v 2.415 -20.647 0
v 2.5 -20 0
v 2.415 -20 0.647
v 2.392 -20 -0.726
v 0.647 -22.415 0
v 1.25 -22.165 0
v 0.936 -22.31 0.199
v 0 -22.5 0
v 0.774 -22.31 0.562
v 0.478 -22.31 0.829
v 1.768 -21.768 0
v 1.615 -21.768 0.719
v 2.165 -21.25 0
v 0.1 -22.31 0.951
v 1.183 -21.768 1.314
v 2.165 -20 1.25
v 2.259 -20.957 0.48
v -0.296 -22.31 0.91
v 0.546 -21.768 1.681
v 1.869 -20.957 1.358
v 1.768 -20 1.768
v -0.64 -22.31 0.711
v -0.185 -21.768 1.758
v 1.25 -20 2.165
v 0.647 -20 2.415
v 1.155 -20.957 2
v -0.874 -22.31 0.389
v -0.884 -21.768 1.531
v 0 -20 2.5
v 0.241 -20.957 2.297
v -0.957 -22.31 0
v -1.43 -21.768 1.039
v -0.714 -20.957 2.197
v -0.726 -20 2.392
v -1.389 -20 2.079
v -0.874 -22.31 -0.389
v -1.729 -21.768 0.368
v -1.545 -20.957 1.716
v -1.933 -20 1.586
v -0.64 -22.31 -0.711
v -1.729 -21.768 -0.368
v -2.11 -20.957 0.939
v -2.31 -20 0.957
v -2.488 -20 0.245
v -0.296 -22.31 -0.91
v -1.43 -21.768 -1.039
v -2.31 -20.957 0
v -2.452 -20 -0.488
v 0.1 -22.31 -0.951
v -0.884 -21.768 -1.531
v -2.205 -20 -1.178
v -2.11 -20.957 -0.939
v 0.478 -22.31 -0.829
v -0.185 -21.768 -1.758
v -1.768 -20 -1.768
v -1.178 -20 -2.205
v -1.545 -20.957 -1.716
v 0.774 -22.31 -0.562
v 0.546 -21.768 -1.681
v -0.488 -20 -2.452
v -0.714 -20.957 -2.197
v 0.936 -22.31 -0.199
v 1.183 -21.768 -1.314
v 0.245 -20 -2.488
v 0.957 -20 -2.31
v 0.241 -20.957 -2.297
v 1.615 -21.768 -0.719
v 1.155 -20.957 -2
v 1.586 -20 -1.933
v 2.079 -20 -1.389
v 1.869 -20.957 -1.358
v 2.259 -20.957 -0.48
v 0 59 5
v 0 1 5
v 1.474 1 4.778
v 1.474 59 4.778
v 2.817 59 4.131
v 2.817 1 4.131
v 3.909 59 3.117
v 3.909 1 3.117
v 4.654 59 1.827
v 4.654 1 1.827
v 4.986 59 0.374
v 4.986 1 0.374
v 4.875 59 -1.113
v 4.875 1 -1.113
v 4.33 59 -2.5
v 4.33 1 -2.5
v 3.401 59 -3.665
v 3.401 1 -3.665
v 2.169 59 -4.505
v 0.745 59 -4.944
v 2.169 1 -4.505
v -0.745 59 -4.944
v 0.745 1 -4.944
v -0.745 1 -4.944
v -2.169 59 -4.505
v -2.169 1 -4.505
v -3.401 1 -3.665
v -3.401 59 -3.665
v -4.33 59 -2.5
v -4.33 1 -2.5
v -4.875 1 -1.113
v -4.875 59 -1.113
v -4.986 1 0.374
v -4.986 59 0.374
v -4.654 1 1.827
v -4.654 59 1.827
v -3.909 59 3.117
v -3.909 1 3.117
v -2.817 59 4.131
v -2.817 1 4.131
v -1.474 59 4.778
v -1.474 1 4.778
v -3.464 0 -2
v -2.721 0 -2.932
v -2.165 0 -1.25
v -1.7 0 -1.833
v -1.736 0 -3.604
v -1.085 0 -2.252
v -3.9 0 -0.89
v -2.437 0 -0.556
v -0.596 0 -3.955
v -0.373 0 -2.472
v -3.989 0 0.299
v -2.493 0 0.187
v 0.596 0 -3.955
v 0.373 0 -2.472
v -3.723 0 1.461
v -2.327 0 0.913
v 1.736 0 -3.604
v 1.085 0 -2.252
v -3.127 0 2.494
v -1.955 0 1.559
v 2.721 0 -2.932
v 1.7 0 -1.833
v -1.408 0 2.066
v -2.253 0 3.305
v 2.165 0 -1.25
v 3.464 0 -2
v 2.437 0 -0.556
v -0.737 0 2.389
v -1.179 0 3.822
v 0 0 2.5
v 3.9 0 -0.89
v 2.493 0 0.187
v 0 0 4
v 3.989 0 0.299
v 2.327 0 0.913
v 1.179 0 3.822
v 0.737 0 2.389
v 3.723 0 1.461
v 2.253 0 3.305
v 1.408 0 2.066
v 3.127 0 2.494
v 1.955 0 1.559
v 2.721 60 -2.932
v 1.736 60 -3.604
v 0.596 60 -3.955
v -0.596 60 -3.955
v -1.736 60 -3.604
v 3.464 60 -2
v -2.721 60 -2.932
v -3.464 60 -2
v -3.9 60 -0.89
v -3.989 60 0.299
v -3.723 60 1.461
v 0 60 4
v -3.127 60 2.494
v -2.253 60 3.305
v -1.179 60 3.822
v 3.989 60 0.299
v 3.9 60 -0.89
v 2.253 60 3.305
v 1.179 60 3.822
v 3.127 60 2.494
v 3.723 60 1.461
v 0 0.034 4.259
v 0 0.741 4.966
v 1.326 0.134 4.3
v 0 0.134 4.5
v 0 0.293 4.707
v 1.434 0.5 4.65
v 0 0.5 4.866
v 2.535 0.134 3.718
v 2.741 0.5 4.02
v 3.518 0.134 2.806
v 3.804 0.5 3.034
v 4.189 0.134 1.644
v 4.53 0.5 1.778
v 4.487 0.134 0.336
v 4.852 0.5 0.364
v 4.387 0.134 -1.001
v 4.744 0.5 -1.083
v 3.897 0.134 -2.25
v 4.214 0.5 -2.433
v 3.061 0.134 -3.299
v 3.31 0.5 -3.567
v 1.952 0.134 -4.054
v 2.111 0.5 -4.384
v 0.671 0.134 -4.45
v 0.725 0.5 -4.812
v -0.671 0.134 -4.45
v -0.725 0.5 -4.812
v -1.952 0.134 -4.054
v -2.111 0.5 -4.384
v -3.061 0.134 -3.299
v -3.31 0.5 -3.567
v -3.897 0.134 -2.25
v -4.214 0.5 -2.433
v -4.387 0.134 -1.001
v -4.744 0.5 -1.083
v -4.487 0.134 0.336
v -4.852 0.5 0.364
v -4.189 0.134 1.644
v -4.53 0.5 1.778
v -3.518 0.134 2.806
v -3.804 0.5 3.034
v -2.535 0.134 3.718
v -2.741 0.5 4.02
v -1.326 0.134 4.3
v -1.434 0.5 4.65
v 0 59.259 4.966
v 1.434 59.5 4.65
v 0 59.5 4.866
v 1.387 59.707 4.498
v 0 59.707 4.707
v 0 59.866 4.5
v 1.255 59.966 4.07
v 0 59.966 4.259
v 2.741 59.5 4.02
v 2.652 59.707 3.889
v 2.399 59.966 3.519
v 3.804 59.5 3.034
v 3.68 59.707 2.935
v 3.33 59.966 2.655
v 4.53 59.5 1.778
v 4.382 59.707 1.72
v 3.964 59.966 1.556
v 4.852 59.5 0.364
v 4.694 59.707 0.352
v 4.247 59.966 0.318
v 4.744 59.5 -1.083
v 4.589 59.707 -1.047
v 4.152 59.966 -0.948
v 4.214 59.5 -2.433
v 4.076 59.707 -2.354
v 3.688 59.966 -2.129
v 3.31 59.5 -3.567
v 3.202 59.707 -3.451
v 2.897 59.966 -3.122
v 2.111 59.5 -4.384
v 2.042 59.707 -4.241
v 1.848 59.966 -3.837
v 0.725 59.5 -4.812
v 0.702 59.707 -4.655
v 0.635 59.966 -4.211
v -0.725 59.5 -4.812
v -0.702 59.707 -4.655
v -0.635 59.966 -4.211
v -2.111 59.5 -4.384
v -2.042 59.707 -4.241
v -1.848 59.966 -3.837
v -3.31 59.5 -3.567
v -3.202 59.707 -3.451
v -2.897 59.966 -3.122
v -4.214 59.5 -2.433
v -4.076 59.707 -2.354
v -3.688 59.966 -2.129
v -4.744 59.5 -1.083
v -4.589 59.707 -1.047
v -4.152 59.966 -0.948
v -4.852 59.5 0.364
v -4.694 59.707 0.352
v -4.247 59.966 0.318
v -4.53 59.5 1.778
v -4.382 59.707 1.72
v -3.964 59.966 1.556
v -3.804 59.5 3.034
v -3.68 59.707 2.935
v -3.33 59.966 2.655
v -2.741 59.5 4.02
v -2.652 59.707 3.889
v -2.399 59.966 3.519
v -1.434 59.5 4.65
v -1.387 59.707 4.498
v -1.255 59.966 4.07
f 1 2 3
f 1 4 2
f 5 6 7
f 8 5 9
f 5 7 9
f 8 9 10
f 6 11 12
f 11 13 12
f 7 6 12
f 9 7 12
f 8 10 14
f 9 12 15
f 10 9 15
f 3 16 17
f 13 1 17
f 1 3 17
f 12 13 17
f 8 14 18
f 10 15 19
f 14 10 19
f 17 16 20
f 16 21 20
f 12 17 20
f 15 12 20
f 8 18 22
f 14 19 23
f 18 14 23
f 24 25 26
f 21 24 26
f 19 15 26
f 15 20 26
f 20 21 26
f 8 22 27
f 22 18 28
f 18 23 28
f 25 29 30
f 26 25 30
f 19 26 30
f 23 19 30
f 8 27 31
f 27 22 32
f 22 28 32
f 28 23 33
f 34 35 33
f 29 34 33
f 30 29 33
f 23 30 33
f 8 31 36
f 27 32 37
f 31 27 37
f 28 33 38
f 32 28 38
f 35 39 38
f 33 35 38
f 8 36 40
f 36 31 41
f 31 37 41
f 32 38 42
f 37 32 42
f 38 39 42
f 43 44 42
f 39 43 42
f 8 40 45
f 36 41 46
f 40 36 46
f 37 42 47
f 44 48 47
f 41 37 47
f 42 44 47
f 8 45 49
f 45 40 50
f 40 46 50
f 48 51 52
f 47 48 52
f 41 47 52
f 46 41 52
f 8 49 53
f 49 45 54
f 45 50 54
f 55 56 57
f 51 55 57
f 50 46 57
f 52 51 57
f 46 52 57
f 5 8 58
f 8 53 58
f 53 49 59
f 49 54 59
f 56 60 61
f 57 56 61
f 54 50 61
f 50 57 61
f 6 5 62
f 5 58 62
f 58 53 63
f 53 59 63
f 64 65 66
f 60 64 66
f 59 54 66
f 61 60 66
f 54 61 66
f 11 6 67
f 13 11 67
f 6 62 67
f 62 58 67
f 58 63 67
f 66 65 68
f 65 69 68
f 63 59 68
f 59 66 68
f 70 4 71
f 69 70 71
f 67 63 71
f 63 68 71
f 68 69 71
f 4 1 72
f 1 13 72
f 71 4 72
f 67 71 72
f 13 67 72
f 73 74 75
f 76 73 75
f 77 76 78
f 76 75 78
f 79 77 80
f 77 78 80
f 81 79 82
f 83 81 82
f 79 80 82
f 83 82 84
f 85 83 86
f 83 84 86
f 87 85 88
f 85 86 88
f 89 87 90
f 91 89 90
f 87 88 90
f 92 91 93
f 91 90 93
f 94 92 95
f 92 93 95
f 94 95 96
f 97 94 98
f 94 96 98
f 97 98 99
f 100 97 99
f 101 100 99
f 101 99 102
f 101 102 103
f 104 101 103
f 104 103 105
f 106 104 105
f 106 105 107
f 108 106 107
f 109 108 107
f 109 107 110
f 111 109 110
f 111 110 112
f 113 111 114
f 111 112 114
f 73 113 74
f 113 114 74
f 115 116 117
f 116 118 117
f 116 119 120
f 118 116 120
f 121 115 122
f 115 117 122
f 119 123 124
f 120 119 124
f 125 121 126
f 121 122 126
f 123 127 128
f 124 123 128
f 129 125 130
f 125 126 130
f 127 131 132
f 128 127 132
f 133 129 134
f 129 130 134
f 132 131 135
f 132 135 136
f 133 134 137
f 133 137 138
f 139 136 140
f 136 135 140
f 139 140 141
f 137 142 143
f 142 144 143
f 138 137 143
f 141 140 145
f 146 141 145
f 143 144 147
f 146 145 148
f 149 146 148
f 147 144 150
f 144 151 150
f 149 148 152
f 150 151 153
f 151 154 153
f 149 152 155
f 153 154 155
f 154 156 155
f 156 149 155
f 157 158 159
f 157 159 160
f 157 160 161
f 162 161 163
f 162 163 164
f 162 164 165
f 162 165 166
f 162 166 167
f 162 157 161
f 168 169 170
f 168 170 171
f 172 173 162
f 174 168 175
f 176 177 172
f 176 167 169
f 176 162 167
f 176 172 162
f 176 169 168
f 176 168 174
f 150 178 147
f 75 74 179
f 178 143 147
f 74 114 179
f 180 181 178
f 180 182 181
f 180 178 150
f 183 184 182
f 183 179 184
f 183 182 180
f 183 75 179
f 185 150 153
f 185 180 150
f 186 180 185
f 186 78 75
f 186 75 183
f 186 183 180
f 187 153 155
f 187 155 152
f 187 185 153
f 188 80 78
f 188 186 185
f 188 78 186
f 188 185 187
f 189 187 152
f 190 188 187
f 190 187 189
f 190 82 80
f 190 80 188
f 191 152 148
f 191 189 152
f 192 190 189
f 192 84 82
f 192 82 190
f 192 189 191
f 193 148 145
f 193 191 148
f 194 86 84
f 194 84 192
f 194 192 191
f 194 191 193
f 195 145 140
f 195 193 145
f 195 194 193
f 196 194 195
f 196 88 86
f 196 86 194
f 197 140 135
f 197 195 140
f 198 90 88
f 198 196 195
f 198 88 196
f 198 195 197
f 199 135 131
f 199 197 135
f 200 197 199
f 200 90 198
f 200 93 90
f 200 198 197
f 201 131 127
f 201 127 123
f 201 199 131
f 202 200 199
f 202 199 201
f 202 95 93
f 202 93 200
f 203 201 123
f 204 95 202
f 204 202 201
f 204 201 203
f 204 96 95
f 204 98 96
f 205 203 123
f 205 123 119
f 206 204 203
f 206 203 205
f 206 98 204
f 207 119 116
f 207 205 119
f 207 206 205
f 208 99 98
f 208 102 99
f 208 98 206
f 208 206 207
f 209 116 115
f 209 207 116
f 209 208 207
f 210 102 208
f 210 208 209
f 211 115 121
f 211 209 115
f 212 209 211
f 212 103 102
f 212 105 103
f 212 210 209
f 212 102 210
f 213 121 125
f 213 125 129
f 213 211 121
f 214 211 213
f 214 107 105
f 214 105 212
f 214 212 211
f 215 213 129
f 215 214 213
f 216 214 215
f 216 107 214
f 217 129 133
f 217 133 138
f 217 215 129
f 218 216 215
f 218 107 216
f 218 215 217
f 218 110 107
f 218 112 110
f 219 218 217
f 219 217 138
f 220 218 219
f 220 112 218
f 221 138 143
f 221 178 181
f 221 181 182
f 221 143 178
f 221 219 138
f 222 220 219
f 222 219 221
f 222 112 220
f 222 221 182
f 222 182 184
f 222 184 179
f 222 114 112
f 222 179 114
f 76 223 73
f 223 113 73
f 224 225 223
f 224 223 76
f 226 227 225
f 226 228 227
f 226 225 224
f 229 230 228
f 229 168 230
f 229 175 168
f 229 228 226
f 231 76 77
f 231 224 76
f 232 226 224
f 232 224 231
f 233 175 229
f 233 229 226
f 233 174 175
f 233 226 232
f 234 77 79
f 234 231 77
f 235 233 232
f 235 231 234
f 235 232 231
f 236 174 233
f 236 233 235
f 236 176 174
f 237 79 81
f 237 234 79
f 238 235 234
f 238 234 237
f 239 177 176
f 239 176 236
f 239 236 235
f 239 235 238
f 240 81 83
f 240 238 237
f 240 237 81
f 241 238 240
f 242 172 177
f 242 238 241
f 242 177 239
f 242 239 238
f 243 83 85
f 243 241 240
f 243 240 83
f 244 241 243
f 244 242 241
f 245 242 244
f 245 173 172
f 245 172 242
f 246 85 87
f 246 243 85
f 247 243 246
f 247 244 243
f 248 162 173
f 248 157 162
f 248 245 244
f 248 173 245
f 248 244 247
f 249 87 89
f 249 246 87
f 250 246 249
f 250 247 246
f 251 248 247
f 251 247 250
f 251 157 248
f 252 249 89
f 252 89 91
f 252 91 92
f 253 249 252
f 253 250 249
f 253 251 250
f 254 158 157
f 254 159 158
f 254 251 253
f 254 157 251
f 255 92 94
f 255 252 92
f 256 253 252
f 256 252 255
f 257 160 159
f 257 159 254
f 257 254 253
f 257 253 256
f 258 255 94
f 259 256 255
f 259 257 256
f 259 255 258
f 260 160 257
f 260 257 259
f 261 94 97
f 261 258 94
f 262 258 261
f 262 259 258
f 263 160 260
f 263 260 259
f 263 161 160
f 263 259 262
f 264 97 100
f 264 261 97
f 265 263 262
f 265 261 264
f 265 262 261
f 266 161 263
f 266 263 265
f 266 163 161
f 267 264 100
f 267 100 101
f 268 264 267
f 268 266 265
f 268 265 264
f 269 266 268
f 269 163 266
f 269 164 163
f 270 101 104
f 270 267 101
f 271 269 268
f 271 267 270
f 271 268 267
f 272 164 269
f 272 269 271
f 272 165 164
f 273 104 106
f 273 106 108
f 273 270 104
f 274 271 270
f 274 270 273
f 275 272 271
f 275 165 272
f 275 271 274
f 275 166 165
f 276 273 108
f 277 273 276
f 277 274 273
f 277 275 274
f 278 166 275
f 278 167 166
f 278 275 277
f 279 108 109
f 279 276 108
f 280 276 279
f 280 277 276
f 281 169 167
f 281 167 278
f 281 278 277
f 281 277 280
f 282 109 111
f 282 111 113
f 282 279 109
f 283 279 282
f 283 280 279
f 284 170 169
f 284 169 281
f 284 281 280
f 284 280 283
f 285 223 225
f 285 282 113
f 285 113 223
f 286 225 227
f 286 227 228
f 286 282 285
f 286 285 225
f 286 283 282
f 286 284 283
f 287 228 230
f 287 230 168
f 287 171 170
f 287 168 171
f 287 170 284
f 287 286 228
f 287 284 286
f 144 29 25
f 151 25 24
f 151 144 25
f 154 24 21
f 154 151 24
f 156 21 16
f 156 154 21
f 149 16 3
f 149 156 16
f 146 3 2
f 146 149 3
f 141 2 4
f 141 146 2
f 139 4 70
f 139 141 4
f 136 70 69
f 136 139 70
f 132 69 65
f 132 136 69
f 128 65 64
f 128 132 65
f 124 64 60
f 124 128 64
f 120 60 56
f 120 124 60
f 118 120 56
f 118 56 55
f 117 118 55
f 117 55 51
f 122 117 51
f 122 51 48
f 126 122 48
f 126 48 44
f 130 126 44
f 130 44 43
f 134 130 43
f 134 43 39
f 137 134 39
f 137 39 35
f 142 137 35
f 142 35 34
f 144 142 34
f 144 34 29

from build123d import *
from build123d.topology import SkipClean

# Parameters (mm, degrees)
SKETCH_1_R      = 5
EXTRUDE_1_DEPTH = 60
SKETCH_2_R      = 2.5
EXTRUDE_2_DEPTH = 20
FILLET_1_R      = 1


with BuildPart() as part:
    # 草图1 → 凸台-拉伸1 (new body)
    with BuildSketch(Plane(origin=(0, 0, 0), x_dir=(1, 0, 0), z_dir=(0, 1, 0))):
        with Locations(Location((0, 0, 0), (0, 0, 270))):
            Circle(SKETCH_1_R)
    extrude(amount=EXTRUDE_1_DEPTH)

    # 草图2 → 凸台-拉伸2 (add)
    with BuildSketch(Plane(origin=(0, 0, 0), x_dir=(1, 0, 0), z_dir=(0, 1, 0))):
        with Locations(Location((0, 0, 0), (0, 0, 270))):
            Circle(SKETCH_2_R)
    extrude(amount=-EXTRUDE_2_DEPTH)

    # 草图3 → 旋转1 (revolve)
    with SkipClean():  # the faces are left unmerged after this step: merging them gives an invalid solid
        with BuildSketch(Plane.XY):
            with BuildLine():
                ThreePointArc((2.5, -20), (1.767766953, -18.232233047), (0, -17.5))
                Line((0, -17.5), (0, -22.5))
                ThreePointArc((0, -22.5), (1.767766953, -21.767766953), (2.5, -20))
            make_face()
            with BuildLine():
                Line((0, -22.5), (0, -17.5))
                ThreePointArc((0, -17.5), (-2.5, -20), (0, -22.5))
            make_face()
        revolve(axis=Axis((0, -17.5, 0), (0, -1, 0)))

    # 圆角1
    fillet_1_edges = [part.edges().sort_by_distance(p)[0] for p in [
        (0, 0, -5),
        (0, 60, -5),
    ]]
    fillet(fillet_1_edges, radius=FILLET_1_R)


solid = part.part
